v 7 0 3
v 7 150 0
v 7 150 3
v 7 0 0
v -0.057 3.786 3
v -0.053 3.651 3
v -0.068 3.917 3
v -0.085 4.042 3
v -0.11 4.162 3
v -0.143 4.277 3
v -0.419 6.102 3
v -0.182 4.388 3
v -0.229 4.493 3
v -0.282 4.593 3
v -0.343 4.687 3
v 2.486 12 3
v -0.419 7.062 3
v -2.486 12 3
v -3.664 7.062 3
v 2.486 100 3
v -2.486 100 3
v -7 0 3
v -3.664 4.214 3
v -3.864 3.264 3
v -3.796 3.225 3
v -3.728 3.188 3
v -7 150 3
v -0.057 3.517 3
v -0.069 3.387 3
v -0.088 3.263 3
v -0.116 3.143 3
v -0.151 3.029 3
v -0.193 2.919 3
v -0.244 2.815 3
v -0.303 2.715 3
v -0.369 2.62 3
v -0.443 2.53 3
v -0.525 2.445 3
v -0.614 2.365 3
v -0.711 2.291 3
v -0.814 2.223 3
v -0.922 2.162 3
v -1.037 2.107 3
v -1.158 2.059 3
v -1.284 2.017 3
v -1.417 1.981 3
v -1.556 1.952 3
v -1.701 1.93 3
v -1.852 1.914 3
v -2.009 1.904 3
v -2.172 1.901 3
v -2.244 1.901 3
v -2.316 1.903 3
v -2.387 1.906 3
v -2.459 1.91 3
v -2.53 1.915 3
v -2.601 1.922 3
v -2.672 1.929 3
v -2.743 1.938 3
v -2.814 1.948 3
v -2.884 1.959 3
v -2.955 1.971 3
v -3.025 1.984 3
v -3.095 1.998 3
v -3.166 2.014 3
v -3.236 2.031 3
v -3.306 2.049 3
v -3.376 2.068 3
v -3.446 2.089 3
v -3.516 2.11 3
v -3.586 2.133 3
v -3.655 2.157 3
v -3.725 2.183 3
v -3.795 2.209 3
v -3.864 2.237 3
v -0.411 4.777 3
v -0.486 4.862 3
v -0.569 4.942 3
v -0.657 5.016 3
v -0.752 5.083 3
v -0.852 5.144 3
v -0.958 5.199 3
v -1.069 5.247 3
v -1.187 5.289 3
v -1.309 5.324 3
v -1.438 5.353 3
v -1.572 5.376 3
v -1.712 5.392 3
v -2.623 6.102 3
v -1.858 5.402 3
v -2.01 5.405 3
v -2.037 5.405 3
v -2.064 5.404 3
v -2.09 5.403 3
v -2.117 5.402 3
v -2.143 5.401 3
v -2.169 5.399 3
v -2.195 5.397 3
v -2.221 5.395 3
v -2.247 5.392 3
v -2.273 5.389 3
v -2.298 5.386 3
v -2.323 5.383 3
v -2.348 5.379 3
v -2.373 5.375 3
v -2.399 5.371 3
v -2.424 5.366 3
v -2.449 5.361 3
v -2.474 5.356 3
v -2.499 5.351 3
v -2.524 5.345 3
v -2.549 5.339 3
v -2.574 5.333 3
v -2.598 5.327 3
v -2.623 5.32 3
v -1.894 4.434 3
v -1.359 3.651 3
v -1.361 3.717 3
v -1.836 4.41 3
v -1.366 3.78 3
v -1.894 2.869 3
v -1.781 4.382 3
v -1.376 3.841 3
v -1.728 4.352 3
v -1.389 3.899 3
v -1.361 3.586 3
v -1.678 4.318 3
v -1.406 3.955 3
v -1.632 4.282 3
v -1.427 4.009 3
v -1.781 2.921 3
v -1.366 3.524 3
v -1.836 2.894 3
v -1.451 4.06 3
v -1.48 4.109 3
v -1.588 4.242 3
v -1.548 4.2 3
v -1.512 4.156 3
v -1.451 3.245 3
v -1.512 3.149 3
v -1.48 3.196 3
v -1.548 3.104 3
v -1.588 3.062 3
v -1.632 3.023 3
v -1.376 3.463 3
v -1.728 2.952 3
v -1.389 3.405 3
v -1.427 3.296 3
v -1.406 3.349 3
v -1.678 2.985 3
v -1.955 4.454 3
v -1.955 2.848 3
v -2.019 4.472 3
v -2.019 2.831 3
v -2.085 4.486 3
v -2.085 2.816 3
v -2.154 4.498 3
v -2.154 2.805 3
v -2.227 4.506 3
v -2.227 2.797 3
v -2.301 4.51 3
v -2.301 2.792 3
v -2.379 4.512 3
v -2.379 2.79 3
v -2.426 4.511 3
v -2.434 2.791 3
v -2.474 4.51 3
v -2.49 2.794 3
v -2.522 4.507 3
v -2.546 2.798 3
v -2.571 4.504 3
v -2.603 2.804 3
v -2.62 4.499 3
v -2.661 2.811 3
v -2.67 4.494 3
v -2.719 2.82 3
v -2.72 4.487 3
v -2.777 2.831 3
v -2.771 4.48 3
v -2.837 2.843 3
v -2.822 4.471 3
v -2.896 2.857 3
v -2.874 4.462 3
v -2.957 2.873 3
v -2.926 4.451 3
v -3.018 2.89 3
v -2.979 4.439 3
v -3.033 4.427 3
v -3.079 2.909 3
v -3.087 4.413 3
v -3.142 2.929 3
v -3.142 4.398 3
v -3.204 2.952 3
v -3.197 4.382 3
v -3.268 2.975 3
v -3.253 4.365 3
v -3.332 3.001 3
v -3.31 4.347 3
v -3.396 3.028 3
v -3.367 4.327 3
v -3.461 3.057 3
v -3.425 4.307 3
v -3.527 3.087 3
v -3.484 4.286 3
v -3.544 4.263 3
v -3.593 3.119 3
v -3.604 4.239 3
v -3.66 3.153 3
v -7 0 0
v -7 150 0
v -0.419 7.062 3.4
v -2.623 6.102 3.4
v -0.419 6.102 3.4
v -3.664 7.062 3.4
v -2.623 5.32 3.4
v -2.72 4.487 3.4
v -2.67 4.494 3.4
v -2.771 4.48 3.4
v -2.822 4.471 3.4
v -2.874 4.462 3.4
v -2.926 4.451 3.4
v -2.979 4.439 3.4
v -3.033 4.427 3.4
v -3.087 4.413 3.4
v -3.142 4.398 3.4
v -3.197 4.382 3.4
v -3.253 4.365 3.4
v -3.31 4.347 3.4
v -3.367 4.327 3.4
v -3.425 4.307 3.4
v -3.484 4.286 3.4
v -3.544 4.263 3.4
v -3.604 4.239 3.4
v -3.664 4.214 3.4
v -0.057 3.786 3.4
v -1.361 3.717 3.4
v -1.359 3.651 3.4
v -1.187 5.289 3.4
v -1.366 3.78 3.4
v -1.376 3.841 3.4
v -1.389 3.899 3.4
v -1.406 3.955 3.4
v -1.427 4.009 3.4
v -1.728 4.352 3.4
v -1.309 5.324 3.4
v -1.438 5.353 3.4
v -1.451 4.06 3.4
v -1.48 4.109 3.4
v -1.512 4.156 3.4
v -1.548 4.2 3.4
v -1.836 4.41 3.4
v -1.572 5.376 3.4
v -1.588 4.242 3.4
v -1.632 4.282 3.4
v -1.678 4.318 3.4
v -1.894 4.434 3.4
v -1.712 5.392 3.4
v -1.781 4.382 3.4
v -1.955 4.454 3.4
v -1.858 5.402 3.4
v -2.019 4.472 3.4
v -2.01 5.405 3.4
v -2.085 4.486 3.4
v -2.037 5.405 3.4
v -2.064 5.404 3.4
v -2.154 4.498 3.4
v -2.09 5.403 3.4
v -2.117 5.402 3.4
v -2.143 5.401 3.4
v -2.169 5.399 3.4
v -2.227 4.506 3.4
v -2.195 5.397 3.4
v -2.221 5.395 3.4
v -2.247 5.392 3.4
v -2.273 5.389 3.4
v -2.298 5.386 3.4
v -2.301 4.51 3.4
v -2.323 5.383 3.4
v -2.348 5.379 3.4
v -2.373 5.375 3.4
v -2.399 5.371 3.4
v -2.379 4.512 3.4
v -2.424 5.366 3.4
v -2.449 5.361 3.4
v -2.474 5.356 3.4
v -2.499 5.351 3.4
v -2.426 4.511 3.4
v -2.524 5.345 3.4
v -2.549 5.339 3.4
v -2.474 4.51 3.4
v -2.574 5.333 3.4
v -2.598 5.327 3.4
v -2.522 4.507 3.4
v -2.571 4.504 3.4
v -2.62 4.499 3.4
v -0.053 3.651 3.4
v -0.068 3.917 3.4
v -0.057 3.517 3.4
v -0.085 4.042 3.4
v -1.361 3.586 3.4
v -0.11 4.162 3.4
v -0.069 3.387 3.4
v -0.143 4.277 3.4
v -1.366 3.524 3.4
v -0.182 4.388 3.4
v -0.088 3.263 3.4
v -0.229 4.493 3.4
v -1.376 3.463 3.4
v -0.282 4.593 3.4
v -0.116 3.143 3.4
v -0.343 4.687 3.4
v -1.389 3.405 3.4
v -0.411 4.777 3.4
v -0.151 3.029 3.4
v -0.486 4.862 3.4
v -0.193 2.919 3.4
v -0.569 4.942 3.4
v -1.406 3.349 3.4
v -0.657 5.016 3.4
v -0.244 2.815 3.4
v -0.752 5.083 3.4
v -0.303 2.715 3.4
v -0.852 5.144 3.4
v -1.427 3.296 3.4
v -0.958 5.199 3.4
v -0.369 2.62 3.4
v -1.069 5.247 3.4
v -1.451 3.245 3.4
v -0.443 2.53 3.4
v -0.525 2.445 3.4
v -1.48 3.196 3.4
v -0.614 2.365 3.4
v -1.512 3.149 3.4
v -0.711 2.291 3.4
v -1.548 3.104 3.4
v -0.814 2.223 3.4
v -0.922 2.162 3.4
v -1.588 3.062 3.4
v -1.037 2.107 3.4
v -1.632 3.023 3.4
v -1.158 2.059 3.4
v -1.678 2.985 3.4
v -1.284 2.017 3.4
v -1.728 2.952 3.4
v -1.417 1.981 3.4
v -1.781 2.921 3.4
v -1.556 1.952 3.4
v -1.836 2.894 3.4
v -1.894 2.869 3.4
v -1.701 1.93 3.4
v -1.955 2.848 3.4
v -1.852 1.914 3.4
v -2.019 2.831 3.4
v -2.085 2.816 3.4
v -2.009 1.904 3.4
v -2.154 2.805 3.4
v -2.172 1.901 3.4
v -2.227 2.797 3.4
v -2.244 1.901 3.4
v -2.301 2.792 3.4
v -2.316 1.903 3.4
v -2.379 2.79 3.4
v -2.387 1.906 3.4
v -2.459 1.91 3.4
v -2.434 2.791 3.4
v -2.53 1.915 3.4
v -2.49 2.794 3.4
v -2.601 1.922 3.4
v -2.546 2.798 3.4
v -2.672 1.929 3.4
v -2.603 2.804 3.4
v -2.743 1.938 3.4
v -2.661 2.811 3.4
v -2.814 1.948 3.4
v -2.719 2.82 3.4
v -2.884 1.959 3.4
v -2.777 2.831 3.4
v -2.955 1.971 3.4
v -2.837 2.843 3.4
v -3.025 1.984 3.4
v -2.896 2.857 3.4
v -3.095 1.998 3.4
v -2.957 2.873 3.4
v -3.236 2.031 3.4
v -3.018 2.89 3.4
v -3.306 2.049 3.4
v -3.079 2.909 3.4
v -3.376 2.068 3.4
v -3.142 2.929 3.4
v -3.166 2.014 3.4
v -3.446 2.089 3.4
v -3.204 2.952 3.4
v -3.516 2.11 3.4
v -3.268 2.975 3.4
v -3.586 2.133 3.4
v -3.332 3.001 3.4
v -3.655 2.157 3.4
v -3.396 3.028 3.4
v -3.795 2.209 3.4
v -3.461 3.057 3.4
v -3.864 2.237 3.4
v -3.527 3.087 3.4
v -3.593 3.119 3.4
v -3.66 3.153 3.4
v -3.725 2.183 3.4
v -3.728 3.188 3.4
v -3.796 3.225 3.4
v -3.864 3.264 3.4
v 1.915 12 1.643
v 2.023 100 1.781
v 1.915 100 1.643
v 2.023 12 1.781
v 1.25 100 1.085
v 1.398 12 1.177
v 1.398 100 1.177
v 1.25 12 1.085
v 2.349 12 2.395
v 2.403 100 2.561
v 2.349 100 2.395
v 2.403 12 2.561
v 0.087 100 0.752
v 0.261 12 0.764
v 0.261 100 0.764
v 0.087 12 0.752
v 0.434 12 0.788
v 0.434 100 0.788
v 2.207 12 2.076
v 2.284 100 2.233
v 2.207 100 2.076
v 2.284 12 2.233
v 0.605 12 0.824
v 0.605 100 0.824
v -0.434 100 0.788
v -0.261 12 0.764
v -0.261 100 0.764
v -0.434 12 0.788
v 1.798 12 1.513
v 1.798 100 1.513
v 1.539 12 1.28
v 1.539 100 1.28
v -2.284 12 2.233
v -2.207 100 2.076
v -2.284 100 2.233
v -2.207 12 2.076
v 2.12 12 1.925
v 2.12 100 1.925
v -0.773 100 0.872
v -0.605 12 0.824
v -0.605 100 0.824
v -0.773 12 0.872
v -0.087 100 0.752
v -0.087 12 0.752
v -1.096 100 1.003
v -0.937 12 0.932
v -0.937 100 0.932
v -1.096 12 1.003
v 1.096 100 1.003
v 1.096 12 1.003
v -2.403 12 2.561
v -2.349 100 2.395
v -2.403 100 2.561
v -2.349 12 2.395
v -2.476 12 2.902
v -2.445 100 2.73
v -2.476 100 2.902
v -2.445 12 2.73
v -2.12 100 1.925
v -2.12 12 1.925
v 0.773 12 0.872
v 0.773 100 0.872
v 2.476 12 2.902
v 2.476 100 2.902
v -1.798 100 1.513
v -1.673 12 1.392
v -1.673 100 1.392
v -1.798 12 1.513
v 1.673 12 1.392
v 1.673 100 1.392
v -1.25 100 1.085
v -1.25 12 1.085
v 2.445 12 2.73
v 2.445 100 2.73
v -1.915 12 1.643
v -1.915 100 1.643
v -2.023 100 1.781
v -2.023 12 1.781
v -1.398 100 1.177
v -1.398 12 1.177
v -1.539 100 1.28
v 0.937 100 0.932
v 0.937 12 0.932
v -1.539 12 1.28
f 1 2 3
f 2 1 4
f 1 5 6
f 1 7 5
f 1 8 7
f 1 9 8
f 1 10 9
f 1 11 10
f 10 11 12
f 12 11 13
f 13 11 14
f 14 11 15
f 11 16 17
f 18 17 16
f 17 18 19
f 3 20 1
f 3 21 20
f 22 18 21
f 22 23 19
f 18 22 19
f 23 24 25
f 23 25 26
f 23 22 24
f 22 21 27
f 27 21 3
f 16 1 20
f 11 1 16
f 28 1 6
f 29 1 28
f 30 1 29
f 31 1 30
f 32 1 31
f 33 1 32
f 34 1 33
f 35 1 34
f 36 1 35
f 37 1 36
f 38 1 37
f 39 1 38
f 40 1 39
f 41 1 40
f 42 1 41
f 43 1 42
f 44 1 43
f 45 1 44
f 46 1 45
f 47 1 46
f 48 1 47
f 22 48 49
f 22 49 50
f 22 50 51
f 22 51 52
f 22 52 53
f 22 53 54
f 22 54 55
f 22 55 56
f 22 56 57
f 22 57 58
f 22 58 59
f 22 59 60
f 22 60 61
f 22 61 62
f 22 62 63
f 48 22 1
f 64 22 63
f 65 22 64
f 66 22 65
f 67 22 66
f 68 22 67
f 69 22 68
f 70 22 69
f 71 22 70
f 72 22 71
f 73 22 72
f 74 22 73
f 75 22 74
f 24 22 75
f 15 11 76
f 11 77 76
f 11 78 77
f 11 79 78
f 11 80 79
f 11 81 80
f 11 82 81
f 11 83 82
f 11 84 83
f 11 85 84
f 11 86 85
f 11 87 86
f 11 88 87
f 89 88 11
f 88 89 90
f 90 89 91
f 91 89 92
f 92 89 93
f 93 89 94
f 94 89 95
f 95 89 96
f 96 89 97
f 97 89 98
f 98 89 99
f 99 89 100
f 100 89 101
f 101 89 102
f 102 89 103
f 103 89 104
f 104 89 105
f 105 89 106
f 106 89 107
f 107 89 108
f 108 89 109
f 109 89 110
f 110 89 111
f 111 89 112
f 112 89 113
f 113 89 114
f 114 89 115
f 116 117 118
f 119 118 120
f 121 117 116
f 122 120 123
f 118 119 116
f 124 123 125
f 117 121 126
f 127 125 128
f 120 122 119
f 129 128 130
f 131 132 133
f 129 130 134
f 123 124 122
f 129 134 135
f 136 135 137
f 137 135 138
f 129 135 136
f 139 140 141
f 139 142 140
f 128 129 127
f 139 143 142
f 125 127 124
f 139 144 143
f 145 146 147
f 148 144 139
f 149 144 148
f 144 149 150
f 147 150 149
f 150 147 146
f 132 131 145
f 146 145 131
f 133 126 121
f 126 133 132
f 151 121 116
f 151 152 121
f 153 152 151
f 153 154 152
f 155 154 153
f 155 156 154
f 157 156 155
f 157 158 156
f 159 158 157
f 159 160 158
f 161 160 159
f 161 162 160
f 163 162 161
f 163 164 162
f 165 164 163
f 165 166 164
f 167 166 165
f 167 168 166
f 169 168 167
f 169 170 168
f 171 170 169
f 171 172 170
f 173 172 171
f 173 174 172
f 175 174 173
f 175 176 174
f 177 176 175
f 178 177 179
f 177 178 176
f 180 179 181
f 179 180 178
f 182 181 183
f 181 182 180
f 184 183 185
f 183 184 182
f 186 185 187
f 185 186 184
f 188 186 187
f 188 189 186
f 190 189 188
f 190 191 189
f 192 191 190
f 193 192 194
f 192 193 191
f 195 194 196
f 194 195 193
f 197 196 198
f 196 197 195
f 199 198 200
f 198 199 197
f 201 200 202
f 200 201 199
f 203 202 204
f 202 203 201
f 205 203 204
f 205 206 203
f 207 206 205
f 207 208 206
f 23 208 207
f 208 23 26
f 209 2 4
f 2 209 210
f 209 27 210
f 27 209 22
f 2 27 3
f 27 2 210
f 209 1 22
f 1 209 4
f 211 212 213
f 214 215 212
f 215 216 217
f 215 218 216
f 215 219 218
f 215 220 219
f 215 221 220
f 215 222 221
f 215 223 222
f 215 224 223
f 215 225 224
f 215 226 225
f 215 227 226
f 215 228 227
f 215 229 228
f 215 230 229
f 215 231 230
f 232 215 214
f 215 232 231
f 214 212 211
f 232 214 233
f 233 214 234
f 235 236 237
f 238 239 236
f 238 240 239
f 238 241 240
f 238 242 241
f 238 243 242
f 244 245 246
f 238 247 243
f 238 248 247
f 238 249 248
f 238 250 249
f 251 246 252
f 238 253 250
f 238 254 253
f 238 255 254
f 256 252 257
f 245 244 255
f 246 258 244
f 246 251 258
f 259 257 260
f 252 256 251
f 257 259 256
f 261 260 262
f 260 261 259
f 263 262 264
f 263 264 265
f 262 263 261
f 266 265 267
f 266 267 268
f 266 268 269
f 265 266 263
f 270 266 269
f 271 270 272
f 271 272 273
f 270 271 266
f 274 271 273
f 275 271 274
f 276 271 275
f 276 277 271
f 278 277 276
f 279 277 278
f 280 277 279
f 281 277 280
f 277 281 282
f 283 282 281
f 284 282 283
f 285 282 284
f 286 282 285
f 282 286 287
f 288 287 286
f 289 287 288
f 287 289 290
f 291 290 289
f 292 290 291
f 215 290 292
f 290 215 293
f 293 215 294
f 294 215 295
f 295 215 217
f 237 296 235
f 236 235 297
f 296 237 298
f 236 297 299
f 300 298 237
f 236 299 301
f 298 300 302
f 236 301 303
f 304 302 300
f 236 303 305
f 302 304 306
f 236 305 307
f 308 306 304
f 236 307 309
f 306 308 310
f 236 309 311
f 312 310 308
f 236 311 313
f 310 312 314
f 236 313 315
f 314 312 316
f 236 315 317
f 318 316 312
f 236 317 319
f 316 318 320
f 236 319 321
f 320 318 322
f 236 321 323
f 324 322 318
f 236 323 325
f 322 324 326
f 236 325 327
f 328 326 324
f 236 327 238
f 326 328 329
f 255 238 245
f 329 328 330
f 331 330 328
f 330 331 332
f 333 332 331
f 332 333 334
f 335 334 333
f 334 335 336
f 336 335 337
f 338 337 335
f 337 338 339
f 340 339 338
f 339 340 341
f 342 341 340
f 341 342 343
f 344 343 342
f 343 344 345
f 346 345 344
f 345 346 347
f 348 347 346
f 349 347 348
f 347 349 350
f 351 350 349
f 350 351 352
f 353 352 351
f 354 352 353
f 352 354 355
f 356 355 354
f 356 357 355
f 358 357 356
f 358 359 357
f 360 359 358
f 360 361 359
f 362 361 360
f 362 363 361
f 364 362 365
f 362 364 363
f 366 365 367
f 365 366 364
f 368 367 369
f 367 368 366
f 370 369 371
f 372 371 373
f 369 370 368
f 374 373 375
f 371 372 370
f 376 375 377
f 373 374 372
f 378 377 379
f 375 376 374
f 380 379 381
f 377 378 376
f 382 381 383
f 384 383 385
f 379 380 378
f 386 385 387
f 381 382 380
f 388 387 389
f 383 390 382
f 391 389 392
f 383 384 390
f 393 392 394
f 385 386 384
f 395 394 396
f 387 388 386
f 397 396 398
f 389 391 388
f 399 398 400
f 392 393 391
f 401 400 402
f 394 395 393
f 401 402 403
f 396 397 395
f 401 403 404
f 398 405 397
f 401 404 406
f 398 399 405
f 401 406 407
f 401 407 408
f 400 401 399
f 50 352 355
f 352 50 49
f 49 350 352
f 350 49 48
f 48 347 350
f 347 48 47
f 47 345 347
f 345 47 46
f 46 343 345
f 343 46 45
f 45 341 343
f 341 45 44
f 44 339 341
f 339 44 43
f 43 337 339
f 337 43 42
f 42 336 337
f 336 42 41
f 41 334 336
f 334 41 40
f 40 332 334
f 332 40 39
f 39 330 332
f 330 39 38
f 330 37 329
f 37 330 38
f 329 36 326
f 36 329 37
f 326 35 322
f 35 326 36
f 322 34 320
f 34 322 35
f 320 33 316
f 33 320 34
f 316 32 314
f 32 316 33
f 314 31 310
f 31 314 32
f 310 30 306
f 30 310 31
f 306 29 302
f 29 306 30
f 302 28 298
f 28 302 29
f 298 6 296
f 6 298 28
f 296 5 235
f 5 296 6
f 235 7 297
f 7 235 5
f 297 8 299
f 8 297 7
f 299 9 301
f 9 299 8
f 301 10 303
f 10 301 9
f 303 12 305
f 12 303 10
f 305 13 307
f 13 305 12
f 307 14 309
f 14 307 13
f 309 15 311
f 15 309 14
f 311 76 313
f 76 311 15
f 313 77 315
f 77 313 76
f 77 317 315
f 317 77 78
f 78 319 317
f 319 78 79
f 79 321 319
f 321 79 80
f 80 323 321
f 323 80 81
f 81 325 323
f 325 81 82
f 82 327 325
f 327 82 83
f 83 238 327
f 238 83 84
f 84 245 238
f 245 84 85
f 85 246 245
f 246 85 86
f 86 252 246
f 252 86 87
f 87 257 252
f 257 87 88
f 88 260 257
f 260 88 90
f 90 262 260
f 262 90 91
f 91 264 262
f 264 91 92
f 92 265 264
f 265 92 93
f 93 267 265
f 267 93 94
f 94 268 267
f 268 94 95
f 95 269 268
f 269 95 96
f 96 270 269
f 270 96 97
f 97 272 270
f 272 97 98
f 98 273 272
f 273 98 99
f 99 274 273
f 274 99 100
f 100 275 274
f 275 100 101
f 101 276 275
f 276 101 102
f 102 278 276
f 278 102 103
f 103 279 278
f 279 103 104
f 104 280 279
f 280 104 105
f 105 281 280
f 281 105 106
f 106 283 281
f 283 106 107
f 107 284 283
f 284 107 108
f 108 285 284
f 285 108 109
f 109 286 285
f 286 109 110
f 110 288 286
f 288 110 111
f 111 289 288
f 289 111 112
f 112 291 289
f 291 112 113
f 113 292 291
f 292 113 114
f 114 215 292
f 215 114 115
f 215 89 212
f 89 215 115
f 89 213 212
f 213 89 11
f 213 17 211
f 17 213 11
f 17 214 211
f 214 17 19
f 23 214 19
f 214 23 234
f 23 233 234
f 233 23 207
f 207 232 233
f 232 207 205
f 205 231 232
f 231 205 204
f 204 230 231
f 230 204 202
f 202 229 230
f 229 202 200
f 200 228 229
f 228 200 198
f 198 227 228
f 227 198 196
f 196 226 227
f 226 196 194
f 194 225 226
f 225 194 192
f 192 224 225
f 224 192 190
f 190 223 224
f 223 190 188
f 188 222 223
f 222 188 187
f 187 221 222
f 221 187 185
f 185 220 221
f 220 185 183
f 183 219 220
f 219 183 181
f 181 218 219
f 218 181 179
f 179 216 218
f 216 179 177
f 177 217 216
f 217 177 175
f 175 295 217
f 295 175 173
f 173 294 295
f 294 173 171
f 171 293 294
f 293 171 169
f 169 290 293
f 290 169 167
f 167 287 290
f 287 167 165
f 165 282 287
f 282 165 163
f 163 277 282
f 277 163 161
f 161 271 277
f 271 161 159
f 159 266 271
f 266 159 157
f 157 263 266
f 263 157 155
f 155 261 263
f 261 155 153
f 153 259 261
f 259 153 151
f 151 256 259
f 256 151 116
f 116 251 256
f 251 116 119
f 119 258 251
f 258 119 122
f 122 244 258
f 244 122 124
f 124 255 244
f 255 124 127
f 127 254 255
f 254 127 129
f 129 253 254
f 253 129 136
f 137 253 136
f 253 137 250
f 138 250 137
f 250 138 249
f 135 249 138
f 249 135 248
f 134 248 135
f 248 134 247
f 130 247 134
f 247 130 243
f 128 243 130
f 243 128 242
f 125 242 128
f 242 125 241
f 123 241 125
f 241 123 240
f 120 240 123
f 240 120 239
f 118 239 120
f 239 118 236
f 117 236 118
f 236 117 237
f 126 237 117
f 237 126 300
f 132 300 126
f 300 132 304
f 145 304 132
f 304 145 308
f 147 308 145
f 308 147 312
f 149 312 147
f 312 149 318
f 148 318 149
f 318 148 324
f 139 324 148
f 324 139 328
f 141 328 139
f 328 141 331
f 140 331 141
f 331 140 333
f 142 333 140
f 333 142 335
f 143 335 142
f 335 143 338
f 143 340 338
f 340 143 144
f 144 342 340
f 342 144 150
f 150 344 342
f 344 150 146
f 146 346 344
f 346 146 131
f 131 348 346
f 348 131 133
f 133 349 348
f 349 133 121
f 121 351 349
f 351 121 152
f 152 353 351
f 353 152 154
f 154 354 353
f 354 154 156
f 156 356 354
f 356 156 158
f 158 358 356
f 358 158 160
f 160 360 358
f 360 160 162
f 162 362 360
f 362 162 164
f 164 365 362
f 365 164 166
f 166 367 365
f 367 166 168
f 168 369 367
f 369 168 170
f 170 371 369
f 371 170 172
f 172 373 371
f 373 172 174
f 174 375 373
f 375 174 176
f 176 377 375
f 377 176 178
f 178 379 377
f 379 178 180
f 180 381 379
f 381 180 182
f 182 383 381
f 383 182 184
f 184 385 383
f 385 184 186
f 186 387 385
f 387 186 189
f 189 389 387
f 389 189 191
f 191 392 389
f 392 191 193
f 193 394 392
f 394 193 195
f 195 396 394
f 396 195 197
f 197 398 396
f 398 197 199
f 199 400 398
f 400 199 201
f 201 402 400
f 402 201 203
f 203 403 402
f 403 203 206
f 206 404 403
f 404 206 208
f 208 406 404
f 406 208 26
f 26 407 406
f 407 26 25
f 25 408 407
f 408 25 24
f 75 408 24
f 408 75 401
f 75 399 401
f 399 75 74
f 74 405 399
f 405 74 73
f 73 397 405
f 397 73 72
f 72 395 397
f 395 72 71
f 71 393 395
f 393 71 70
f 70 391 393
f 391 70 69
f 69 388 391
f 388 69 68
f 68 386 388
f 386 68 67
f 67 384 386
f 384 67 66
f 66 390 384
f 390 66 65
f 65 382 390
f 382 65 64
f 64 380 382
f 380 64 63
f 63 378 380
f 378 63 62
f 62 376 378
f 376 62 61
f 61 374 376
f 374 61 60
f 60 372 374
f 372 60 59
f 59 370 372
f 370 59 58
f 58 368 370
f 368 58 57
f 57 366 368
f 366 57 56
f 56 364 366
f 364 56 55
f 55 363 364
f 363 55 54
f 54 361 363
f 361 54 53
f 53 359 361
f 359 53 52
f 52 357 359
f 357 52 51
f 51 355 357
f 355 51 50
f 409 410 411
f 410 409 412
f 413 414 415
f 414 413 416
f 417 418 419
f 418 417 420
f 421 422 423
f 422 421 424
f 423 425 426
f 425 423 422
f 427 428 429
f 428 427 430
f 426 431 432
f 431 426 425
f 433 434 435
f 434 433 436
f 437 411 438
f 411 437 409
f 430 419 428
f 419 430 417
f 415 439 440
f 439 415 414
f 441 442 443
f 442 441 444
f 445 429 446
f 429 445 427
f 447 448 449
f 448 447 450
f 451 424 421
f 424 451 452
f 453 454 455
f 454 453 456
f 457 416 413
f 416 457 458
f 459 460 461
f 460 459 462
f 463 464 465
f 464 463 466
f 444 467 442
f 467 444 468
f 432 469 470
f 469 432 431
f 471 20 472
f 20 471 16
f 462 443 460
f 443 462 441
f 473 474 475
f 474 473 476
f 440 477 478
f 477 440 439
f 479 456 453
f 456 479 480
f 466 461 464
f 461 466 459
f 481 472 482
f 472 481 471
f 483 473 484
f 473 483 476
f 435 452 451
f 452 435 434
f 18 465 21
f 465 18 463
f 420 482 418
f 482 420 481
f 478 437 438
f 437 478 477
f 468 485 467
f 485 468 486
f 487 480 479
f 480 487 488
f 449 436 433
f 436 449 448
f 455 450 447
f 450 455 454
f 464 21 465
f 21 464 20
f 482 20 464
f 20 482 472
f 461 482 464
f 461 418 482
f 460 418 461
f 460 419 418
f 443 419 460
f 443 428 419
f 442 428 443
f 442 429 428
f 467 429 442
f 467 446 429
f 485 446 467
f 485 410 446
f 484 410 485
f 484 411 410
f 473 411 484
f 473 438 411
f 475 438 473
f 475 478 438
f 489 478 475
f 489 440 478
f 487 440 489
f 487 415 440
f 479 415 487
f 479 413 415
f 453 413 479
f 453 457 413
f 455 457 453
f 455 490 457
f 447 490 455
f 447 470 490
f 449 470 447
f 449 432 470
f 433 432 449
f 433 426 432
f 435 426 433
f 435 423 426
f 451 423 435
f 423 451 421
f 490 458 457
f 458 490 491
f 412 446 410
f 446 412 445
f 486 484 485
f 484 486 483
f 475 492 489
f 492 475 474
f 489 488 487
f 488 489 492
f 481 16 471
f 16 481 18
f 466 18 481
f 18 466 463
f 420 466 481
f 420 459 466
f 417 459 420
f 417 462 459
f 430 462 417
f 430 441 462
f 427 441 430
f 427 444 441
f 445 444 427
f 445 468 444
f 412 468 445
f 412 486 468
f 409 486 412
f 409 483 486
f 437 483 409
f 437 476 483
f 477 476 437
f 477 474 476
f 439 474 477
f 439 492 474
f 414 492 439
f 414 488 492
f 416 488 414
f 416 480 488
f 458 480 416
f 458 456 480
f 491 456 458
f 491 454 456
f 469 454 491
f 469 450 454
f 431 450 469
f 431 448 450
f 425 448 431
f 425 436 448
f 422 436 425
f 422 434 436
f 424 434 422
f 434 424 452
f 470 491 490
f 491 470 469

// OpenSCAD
// file: module/drill-bit-storage.scad
/*
    Drill bit storage
*/

$fn=90;  // accuracy


// Constants (Don't change)
storageLenght = 100; // Not Bit lenght
maxBitLenght  = 70;  // Check bit lenght
storageWidth  = 10;  // Minimum width

// Bit dependent
bitDiameter = 4.0;



module drillBitStorage (bitDiameter,maxBitLenght,
	storageWidth,storageLenght){

// Automatic Variables  (Don't change)
diameterText      = str(bitDiameter);
storageHight      = bitDiameter*0.6; 
bitRadius         = bitDiameter/2;
bitPositionHeight = storageHight+bitDiameter*0.05; 


// Delition for crating drill track
difference() {

// Union for text and storage
union(){

// Storage 
translate([
    -storageWidth/2,    // Centering
    0, 
    0
    ]) 
cube(size = [
    storageWidth,
    storageLenght,
    storageHight
    ]);

// Milimiter dimension text
translate([
    -4.4,               // Fine deling x-axis
    2,                  // Fine deling y-axis 
    storageHight         
    ])
linear_extrude(height=0.4)text(
    diameterText,  // Dynamic text
    size=5,
    font="tohoma:style=bold",
    spacing=0.9
    );
    
// End of union    
}  

// Begining of Delition
// Drill tracl
rotate([90,0,0])
translate([
    0,                   // x-axis
    bitPositionHeight,   // Z-axis
    -(maxBitLenght+12)    // y-axis
    ])  
cylinder(
    h = maxBitLenght,    // y-axis
    r = bitRadius        // x-axis 
    );      

// End of Delition
}}
// main file
/*
    Drill bit storage
*/

$fn=90;  // accuracy

// import module
use <module/drill-bit-storage.scad>;



// Tootale lenght of the unit
storageLenght = 150; 

// Width of the unit
storageWidth  = 14;  // (Constant under 4mm)  

// The lenght of the drill bit
maxBitLenght  = 88;  

// Drill bit diameter  
bitDiameter = 5.0;


// Call the module
drillBitStorage 
    (bitDiameter,maxBitLenght,storageWidth,storageLenght);
